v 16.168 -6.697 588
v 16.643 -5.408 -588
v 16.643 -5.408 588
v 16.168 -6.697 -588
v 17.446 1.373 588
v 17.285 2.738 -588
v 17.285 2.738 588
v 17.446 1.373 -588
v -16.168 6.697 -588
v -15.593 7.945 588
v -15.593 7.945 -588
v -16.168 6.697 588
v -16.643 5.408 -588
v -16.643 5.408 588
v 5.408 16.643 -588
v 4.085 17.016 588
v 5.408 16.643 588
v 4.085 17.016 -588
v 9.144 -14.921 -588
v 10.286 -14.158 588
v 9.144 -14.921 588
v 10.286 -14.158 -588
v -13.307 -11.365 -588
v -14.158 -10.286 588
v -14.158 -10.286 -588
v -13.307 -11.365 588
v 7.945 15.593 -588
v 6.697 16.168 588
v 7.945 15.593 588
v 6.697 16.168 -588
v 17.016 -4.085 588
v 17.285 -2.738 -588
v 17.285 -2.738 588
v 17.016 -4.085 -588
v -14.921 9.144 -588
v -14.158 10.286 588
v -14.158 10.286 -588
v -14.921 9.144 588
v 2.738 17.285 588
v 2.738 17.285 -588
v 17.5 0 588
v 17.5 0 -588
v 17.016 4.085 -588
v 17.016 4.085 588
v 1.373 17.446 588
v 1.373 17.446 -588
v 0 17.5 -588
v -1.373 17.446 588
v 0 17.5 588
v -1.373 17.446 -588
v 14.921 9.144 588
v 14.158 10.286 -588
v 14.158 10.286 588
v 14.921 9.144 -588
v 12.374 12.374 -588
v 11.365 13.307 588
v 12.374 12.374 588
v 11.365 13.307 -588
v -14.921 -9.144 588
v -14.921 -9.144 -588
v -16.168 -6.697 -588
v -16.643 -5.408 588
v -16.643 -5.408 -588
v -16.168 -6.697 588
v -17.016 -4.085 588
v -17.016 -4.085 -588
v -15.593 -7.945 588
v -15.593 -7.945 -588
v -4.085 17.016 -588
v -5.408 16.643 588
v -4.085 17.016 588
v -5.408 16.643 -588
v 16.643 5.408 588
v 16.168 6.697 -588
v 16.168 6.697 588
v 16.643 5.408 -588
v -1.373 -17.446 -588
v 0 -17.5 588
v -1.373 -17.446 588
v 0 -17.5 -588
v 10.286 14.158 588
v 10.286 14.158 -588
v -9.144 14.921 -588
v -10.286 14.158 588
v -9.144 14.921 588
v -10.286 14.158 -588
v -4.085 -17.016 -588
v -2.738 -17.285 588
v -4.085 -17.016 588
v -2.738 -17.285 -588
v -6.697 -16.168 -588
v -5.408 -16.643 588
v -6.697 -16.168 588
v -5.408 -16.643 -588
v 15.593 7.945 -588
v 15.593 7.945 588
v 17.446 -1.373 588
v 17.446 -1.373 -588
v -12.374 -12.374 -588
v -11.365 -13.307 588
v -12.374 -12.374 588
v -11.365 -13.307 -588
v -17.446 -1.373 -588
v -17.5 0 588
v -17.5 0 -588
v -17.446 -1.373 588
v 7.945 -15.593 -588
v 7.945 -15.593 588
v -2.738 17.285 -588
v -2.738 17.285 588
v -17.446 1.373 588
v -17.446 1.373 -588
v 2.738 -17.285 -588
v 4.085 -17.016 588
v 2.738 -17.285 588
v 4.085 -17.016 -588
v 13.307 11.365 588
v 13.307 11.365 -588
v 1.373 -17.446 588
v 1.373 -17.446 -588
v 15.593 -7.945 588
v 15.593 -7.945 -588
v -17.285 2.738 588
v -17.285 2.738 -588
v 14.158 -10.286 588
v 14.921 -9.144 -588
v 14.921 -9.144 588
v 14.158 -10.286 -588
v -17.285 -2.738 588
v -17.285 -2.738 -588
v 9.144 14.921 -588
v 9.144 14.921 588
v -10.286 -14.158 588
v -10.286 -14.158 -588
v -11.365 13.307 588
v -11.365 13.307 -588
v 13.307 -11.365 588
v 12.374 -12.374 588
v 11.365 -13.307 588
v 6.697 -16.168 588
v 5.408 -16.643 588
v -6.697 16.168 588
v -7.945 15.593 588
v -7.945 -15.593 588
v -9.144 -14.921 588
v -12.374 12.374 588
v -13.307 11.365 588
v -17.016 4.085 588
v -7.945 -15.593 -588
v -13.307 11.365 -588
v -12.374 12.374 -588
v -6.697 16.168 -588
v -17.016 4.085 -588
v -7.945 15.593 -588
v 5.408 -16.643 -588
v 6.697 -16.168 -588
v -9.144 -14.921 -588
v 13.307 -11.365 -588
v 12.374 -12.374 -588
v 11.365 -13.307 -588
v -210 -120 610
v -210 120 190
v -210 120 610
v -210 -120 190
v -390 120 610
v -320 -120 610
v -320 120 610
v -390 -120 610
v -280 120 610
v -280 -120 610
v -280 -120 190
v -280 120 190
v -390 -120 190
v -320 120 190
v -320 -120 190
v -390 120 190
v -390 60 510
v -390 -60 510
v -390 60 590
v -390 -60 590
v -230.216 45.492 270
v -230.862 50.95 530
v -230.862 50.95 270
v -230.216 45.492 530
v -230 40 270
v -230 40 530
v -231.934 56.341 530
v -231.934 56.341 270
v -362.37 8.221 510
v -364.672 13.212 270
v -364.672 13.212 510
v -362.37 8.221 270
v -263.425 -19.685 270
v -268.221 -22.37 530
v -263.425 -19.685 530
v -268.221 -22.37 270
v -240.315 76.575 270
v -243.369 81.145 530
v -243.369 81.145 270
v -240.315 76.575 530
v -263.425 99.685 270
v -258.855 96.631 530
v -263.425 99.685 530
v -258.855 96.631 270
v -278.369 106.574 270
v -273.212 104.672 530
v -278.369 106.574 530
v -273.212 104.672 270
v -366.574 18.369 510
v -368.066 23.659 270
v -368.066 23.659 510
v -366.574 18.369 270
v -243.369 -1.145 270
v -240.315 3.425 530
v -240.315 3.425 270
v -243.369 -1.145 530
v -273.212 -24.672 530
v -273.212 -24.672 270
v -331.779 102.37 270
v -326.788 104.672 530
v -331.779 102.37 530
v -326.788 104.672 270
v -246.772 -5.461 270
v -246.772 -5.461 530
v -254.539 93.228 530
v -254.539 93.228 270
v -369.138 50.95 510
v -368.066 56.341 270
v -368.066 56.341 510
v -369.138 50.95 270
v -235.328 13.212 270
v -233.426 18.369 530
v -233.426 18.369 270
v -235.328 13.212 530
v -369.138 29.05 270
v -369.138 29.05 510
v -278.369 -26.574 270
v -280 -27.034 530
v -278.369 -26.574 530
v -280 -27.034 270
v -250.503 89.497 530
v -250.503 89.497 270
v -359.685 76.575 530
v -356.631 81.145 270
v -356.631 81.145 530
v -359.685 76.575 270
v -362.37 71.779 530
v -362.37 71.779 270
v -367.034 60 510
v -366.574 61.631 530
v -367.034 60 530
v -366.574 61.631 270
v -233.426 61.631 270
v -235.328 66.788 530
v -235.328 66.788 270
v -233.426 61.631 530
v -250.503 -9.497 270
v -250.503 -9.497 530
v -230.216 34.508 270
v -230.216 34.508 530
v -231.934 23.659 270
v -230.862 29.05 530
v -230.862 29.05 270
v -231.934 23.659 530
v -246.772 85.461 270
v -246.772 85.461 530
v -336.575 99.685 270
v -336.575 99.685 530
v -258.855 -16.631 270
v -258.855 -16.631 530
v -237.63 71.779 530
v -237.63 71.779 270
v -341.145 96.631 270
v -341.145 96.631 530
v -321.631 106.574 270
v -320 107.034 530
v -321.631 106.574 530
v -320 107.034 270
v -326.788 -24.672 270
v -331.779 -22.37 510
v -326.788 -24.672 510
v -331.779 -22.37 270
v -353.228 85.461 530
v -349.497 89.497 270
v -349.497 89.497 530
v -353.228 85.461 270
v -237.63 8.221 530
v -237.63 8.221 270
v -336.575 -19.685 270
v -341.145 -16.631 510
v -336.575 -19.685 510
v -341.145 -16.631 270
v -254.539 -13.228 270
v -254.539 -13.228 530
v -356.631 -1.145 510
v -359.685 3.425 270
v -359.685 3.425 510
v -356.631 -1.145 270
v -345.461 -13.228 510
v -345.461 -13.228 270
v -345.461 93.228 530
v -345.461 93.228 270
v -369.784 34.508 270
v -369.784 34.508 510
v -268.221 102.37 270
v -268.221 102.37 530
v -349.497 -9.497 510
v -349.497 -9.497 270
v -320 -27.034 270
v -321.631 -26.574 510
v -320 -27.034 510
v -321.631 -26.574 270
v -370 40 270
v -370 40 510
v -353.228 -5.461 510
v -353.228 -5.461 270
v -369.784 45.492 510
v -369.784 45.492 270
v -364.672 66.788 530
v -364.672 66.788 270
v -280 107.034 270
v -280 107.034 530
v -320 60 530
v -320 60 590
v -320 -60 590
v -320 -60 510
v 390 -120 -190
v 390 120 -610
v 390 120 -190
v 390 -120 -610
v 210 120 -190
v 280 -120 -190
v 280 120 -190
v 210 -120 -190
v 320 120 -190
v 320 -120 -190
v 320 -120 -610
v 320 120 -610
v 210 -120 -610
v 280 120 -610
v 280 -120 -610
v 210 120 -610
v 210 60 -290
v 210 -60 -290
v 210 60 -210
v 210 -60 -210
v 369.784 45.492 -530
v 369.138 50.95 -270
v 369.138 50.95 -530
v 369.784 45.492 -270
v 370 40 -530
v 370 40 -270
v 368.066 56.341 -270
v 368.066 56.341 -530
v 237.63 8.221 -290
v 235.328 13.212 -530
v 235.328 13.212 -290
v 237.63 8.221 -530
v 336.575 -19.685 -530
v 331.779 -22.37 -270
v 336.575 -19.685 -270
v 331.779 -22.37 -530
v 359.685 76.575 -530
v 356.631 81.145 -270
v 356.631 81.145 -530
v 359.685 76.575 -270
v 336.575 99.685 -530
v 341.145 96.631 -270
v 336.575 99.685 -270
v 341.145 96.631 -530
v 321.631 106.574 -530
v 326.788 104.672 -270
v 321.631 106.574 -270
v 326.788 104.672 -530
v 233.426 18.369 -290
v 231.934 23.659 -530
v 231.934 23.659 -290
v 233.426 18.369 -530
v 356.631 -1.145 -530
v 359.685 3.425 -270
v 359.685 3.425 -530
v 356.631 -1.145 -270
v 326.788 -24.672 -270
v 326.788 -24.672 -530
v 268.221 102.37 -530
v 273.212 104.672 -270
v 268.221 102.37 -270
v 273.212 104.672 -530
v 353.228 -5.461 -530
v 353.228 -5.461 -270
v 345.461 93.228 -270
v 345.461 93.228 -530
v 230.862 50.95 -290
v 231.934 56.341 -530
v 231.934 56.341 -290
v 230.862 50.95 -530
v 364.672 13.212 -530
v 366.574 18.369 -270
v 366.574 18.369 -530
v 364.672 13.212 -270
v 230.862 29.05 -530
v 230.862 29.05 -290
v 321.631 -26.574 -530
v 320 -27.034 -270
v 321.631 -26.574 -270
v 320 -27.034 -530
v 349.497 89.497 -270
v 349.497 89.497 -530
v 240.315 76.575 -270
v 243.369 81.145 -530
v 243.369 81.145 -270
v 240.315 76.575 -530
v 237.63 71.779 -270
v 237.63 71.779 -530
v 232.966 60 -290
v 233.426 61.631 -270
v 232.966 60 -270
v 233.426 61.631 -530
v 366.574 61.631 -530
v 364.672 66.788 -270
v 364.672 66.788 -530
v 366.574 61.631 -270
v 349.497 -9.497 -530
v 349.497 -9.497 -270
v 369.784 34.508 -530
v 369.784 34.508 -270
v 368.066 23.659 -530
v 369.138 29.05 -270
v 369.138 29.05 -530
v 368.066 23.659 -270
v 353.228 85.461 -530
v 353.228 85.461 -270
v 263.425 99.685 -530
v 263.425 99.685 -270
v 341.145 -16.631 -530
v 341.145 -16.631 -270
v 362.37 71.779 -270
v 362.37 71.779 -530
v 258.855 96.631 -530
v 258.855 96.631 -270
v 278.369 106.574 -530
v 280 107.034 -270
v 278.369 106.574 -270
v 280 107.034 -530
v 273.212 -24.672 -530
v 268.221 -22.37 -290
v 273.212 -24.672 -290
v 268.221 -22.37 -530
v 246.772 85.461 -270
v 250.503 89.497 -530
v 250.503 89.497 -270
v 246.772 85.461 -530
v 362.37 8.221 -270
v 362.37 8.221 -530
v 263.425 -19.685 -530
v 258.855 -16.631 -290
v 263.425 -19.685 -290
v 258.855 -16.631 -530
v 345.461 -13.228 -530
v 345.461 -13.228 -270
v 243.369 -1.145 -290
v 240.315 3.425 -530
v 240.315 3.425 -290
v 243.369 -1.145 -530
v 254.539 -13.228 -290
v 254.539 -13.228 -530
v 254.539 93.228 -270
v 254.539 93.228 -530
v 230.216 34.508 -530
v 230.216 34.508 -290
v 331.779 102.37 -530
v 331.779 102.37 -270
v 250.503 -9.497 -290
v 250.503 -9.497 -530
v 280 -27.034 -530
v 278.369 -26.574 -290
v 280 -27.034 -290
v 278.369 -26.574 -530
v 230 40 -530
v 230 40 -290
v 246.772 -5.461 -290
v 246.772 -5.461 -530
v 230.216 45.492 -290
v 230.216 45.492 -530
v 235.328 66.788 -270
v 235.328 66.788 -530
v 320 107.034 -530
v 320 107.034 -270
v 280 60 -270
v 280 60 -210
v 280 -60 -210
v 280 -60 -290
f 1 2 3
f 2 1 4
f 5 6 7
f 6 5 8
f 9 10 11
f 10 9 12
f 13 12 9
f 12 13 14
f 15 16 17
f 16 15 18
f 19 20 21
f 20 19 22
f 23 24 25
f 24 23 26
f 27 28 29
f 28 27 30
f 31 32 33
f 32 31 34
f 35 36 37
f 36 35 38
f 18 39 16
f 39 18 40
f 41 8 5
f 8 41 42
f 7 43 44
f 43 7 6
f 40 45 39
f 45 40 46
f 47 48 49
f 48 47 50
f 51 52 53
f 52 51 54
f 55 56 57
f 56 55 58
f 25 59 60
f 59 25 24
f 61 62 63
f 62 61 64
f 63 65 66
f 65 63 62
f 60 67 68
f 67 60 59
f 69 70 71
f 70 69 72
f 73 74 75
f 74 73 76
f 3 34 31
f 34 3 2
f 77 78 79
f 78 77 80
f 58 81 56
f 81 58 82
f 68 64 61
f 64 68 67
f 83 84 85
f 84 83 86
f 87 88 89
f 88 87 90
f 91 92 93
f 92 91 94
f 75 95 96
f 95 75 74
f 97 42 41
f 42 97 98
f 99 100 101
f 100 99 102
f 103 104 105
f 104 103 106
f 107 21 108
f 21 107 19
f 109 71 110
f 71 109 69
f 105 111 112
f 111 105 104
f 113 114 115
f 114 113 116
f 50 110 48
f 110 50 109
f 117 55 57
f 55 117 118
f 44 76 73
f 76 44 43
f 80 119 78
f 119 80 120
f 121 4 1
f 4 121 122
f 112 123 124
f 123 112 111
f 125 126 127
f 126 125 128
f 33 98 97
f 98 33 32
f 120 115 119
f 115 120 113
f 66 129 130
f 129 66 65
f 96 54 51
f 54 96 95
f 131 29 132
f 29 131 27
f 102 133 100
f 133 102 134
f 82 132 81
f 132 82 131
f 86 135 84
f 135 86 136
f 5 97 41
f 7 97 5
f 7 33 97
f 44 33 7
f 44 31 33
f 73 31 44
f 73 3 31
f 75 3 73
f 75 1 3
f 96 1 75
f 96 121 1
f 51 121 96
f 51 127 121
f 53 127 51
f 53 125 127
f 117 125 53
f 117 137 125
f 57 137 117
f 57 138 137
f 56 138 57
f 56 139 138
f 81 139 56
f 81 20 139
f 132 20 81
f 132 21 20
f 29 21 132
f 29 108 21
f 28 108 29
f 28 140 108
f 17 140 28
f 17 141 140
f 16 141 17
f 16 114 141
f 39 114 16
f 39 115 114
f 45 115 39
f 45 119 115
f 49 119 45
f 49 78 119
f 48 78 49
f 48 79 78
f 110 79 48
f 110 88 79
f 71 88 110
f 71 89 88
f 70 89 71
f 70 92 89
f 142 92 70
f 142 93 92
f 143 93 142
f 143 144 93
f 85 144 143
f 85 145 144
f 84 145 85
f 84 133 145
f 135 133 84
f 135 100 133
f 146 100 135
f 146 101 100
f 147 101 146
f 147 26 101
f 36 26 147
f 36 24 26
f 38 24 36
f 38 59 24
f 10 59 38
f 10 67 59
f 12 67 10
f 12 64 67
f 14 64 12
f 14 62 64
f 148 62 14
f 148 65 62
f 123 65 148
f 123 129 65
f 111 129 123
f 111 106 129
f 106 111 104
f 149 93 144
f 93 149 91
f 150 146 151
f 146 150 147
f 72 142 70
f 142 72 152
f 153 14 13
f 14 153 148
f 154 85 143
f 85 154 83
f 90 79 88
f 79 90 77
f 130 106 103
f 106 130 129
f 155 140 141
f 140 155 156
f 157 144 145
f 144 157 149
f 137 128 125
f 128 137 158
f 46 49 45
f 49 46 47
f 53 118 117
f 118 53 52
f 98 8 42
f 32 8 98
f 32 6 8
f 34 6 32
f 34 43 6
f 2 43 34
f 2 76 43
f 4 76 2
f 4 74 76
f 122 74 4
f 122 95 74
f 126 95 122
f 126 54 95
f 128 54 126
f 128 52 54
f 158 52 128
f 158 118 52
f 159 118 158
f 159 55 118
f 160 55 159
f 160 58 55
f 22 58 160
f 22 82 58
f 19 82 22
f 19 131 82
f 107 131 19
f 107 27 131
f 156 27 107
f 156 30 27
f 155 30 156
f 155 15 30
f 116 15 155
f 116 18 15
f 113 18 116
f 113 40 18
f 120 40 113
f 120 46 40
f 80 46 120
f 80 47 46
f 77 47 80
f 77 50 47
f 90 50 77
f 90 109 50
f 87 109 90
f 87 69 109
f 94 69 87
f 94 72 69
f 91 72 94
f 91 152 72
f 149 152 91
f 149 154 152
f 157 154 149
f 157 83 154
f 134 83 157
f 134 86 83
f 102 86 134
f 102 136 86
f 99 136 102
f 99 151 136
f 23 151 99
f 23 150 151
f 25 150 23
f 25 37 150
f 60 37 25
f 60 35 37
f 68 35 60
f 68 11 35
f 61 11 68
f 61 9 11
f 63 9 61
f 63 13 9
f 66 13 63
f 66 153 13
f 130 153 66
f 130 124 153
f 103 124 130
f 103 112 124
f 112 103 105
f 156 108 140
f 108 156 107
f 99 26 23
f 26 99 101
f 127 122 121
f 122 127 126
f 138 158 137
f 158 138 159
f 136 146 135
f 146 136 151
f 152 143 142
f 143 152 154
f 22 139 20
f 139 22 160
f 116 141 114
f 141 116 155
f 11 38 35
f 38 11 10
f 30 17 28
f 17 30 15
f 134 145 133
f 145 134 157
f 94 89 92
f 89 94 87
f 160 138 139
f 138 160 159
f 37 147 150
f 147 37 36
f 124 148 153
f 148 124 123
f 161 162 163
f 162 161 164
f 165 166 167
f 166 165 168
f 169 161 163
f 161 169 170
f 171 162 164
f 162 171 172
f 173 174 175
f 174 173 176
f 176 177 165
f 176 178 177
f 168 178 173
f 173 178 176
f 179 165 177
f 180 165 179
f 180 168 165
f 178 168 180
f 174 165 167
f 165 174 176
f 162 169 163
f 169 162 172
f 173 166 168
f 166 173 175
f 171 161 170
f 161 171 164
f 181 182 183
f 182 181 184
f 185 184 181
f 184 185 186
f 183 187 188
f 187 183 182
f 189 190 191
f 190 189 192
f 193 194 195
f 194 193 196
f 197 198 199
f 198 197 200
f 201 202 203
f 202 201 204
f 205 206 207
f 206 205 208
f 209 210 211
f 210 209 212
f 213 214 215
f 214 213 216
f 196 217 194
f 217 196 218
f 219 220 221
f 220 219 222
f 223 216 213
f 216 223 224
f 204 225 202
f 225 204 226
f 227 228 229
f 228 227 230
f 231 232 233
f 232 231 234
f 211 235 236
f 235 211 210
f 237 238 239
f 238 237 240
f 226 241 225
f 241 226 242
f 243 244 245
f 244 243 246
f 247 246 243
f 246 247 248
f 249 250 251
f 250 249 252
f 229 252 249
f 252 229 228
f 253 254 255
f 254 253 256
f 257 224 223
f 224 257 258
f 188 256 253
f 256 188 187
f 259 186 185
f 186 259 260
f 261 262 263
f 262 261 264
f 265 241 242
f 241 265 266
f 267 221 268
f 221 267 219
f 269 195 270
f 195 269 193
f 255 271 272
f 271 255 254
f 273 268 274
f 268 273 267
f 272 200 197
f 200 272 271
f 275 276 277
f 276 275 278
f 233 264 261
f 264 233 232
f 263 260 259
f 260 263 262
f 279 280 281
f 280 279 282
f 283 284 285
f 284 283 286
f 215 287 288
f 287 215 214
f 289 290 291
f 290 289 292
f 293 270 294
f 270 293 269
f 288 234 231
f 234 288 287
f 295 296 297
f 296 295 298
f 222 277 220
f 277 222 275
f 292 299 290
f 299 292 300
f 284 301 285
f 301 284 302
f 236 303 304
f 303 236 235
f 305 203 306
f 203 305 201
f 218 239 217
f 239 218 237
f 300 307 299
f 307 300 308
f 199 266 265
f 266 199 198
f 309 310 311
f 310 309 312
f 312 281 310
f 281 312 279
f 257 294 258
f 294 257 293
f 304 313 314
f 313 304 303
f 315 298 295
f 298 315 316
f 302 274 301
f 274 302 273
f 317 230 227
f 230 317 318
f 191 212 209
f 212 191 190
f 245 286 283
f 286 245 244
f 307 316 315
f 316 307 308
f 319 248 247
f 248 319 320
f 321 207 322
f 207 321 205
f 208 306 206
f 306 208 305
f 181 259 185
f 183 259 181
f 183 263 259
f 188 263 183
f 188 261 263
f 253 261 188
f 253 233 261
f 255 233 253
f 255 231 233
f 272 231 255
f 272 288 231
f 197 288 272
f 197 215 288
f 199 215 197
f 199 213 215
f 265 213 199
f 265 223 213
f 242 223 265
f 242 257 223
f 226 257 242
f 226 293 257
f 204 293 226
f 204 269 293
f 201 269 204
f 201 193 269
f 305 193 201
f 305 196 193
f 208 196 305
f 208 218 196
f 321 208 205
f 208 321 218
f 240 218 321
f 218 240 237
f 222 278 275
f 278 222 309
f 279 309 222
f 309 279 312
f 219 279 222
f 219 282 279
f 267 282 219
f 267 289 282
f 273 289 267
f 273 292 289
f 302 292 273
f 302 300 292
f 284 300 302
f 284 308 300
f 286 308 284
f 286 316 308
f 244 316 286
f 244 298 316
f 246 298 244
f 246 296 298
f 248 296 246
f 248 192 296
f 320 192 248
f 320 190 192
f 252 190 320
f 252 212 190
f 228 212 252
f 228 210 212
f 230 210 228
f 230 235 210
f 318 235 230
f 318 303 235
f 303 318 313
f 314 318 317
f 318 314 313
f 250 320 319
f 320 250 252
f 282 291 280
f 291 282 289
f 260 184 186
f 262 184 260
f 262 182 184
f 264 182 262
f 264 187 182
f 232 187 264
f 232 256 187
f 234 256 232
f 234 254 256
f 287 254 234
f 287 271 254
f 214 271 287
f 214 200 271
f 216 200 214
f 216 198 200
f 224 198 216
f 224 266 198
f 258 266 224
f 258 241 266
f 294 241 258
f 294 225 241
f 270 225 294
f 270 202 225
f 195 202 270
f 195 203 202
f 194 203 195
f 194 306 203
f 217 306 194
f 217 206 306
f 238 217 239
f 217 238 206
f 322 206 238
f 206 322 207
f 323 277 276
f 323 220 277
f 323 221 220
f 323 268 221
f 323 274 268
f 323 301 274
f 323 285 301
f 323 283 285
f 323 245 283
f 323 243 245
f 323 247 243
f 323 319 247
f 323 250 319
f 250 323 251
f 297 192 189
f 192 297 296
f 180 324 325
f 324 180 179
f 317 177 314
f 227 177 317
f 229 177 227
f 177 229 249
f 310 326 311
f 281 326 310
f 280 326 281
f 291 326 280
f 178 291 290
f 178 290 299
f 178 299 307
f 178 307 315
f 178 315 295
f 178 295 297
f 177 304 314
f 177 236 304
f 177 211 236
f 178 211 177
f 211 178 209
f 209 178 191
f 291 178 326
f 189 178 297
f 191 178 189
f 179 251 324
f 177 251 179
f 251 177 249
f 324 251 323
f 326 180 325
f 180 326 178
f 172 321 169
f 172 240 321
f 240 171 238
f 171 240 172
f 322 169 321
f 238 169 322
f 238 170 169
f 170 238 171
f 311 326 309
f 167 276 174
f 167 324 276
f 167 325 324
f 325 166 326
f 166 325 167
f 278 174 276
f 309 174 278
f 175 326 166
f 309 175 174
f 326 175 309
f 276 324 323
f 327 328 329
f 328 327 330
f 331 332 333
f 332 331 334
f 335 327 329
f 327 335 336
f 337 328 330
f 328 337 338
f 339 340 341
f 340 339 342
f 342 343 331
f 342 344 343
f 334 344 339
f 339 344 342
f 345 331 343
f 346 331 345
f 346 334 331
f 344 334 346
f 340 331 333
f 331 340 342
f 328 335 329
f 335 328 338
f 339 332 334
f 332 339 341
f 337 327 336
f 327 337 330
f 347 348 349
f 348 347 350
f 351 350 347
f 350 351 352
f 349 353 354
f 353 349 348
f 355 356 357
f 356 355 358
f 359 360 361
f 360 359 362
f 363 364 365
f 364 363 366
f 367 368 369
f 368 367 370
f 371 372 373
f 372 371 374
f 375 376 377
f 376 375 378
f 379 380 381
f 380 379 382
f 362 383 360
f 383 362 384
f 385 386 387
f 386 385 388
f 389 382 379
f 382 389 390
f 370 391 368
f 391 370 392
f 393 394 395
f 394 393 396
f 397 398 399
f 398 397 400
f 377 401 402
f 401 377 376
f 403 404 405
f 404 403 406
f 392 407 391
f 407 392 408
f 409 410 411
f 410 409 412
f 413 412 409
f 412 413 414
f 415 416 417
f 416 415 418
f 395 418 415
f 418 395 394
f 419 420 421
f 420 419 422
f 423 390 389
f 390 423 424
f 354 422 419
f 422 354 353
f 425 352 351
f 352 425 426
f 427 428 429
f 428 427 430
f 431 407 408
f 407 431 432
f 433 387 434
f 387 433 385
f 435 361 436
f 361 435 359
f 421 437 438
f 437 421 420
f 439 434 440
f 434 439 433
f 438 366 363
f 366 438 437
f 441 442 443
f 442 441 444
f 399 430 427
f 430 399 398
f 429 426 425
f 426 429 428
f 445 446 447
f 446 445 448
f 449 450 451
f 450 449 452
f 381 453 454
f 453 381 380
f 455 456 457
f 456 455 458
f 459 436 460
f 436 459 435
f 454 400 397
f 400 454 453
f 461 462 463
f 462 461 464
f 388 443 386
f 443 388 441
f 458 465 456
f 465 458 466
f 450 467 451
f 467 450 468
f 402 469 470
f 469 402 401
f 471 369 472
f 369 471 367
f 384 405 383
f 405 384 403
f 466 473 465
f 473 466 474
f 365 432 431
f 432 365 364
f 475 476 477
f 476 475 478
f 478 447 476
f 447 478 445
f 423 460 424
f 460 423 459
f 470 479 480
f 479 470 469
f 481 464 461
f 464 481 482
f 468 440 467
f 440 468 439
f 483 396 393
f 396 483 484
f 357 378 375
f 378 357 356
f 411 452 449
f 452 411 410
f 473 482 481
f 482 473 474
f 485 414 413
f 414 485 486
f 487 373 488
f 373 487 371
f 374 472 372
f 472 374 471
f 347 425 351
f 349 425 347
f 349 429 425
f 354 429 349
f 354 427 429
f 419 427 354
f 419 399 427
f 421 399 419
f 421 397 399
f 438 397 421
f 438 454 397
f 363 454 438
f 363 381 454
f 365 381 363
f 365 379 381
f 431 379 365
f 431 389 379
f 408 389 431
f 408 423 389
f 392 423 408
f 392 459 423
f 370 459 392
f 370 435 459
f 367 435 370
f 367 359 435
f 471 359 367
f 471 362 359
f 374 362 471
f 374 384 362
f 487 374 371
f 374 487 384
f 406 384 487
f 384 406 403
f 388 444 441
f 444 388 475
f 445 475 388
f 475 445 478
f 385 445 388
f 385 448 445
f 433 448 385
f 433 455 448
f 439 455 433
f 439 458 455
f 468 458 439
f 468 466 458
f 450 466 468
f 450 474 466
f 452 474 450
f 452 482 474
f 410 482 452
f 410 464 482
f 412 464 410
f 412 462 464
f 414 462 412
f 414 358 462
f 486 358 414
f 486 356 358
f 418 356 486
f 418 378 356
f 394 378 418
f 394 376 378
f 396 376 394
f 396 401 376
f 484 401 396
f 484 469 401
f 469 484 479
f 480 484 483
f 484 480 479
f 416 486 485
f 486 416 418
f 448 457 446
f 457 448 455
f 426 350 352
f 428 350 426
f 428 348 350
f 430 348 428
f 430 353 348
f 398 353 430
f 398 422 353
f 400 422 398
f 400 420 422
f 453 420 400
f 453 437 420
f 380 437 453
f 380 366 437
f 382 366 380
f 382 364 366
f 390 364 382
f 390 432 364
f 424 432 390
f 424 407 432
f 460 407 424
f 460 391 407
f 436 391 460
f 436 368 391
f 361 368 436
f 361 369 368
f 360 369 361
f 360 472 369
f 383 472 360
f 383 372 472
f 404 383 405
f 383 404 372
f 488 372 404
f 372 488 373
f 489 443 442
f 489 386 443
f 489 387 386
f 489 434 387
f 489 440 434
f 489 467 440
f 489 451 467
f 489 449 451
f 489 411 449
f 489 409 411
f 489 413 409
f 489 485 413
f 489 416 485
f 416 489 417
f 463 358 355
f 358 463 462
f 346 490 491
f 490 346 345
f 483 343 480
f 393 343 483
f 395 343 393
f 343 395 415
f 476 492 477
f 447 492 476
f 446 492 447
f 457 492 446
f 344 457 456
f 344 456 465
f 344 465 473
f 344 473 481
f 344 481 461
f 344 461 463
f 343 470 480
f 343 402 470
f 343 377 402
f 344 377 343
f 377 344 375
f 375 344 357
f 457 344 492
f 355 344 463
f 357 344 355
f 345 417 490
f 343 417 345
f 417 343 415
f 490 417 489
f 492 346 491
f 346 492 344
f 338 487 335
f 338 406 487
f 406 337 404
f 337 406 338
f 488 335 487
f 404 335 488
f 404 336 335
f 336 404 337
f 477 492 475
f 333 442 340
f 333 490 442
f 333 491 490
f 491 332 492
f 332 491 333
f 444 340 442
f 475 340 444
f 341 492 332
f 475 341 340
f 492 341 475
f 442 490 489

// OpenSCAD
// ============================================================================
// PROJECT: XXXG-00W0 WING GUNDAM ZERO EW - HEAD SENSOR REBALANCING MATRIX
// COMPONENT VAULT: BANDAI CAST RUNNER A - VIEWPORT CAMERAS A11 & A12
// DESIGN SPECS: BINOCULAR OPTICAL HOUSINGS FOR 1:1 SCALED 16.7M CHASSIS
// ELECTRICAL PARITY: WIRELESS INDUCTIVE DATA PATHS FOR SQUARE-WAVE RETROFITS
// ============================================================================

$fn = 80; // High-fidelity circular resolution segment count

// Structural Constants Scaled 1:1 for a 16.7-Meter Airframe Scale (mm)
viewport_block_height = 420;            // Total vertical axis thickness (mm)
eye_lens_bore_diameter = 140;           // Core optical eye-cam lens tracking width (mm)
armor_skin_thickness = 35;              // Solid TiAl defensive protective wall (mm)
harness_conduit_width = 40;             // Cast-in 4oz copper logic trace track (mm)
clip_bracket_width = 90;                // Structural instrumentation snap socket (mm)

module Runner_A_Head_Viewport_Forge() {
    // Central Supply Injection Runner Axis (Molten Feed Line from Siphon Forge)
    color([0.22, 0.22, 0.25]) {
        cylinder(h = viewport_block_height * 2.8, d = 35, center = true);
        // Direct injection gates tracking straight into the part mold cavities
        translate() rotate() cylinder(h = 350, d = 18);
        translate([0, 0, -350]) rotate() cylinder(h = 350, d = 18);
    }
    
    // Instantiate Scaled Structural Molds Symmetrically (Left & Right Halves)
    Cast_Internal_Viewport_Housings();
}

module Cast_Internal_Viewport_Housings() {
    // ---- PART A11: LEFT INTERNAL VIEWPORT CAMERA HOUSING ---- [Page 5, Step 01-2]
    translate([-300, 0, 400]) color([0.4, 0.4, 0.42]) { // Inner Frame Gunmetal Spec
        difference() {
            // Main solid sub-frame cheek and eye structural bone block
            cube([180, 240, viewport_block_height], center = true);
            
            // Central Optical Eye-Camera Clearance Bore (Houses tracking lenses)
            translate([0, 40, 0])
                rotate()
                    cylinder(h = 260, d = eye_lens_bore_diameter, center = true);
            
            // Precision Instrumentation Clip Port for the secondary sensor boards
            translate([-(180/2 - clip_bracket_width/2), 0, (viewport_block_height/2 - 60)])
                cube([clip_bracket_width, 120, 80], center = true);
                
            // Continuous cast-in routing track for the 4oz solid-state wiring rails
            cube([harness_conduit_width, 240 + 10, viewport_block_height + 10], center = true);
        }
    }
    
    // ---- PART A12: RIGHT INTERNAL VIEWPORT CAMERA HOUSING ---- [Page 5, Step 01-2]
    translate([300, 0, -400]) rotate() color([0.4, 0.4, 0.42]) {
        difference() {
            cube([180, 240, viewport_block_height], center = true);
            translate([0, 40, 0])
                rotate()
                    cylinder(h = 260, d = eye_lens_bore_diameter, center = true);
            translate([-(180/2 - clip_bracket_width/2), 0, (viewport_block_height/2 - 60)])
                cube([clip_bracket_width, 120, 80], center = true);
            cube([harness_conduit_width, 240 + 10, viewport_block_height + 10], center = true);
        }
    }
}

// Render Finished Module Workspace Framework
Runner_A_Head_Viewport_Forge();
